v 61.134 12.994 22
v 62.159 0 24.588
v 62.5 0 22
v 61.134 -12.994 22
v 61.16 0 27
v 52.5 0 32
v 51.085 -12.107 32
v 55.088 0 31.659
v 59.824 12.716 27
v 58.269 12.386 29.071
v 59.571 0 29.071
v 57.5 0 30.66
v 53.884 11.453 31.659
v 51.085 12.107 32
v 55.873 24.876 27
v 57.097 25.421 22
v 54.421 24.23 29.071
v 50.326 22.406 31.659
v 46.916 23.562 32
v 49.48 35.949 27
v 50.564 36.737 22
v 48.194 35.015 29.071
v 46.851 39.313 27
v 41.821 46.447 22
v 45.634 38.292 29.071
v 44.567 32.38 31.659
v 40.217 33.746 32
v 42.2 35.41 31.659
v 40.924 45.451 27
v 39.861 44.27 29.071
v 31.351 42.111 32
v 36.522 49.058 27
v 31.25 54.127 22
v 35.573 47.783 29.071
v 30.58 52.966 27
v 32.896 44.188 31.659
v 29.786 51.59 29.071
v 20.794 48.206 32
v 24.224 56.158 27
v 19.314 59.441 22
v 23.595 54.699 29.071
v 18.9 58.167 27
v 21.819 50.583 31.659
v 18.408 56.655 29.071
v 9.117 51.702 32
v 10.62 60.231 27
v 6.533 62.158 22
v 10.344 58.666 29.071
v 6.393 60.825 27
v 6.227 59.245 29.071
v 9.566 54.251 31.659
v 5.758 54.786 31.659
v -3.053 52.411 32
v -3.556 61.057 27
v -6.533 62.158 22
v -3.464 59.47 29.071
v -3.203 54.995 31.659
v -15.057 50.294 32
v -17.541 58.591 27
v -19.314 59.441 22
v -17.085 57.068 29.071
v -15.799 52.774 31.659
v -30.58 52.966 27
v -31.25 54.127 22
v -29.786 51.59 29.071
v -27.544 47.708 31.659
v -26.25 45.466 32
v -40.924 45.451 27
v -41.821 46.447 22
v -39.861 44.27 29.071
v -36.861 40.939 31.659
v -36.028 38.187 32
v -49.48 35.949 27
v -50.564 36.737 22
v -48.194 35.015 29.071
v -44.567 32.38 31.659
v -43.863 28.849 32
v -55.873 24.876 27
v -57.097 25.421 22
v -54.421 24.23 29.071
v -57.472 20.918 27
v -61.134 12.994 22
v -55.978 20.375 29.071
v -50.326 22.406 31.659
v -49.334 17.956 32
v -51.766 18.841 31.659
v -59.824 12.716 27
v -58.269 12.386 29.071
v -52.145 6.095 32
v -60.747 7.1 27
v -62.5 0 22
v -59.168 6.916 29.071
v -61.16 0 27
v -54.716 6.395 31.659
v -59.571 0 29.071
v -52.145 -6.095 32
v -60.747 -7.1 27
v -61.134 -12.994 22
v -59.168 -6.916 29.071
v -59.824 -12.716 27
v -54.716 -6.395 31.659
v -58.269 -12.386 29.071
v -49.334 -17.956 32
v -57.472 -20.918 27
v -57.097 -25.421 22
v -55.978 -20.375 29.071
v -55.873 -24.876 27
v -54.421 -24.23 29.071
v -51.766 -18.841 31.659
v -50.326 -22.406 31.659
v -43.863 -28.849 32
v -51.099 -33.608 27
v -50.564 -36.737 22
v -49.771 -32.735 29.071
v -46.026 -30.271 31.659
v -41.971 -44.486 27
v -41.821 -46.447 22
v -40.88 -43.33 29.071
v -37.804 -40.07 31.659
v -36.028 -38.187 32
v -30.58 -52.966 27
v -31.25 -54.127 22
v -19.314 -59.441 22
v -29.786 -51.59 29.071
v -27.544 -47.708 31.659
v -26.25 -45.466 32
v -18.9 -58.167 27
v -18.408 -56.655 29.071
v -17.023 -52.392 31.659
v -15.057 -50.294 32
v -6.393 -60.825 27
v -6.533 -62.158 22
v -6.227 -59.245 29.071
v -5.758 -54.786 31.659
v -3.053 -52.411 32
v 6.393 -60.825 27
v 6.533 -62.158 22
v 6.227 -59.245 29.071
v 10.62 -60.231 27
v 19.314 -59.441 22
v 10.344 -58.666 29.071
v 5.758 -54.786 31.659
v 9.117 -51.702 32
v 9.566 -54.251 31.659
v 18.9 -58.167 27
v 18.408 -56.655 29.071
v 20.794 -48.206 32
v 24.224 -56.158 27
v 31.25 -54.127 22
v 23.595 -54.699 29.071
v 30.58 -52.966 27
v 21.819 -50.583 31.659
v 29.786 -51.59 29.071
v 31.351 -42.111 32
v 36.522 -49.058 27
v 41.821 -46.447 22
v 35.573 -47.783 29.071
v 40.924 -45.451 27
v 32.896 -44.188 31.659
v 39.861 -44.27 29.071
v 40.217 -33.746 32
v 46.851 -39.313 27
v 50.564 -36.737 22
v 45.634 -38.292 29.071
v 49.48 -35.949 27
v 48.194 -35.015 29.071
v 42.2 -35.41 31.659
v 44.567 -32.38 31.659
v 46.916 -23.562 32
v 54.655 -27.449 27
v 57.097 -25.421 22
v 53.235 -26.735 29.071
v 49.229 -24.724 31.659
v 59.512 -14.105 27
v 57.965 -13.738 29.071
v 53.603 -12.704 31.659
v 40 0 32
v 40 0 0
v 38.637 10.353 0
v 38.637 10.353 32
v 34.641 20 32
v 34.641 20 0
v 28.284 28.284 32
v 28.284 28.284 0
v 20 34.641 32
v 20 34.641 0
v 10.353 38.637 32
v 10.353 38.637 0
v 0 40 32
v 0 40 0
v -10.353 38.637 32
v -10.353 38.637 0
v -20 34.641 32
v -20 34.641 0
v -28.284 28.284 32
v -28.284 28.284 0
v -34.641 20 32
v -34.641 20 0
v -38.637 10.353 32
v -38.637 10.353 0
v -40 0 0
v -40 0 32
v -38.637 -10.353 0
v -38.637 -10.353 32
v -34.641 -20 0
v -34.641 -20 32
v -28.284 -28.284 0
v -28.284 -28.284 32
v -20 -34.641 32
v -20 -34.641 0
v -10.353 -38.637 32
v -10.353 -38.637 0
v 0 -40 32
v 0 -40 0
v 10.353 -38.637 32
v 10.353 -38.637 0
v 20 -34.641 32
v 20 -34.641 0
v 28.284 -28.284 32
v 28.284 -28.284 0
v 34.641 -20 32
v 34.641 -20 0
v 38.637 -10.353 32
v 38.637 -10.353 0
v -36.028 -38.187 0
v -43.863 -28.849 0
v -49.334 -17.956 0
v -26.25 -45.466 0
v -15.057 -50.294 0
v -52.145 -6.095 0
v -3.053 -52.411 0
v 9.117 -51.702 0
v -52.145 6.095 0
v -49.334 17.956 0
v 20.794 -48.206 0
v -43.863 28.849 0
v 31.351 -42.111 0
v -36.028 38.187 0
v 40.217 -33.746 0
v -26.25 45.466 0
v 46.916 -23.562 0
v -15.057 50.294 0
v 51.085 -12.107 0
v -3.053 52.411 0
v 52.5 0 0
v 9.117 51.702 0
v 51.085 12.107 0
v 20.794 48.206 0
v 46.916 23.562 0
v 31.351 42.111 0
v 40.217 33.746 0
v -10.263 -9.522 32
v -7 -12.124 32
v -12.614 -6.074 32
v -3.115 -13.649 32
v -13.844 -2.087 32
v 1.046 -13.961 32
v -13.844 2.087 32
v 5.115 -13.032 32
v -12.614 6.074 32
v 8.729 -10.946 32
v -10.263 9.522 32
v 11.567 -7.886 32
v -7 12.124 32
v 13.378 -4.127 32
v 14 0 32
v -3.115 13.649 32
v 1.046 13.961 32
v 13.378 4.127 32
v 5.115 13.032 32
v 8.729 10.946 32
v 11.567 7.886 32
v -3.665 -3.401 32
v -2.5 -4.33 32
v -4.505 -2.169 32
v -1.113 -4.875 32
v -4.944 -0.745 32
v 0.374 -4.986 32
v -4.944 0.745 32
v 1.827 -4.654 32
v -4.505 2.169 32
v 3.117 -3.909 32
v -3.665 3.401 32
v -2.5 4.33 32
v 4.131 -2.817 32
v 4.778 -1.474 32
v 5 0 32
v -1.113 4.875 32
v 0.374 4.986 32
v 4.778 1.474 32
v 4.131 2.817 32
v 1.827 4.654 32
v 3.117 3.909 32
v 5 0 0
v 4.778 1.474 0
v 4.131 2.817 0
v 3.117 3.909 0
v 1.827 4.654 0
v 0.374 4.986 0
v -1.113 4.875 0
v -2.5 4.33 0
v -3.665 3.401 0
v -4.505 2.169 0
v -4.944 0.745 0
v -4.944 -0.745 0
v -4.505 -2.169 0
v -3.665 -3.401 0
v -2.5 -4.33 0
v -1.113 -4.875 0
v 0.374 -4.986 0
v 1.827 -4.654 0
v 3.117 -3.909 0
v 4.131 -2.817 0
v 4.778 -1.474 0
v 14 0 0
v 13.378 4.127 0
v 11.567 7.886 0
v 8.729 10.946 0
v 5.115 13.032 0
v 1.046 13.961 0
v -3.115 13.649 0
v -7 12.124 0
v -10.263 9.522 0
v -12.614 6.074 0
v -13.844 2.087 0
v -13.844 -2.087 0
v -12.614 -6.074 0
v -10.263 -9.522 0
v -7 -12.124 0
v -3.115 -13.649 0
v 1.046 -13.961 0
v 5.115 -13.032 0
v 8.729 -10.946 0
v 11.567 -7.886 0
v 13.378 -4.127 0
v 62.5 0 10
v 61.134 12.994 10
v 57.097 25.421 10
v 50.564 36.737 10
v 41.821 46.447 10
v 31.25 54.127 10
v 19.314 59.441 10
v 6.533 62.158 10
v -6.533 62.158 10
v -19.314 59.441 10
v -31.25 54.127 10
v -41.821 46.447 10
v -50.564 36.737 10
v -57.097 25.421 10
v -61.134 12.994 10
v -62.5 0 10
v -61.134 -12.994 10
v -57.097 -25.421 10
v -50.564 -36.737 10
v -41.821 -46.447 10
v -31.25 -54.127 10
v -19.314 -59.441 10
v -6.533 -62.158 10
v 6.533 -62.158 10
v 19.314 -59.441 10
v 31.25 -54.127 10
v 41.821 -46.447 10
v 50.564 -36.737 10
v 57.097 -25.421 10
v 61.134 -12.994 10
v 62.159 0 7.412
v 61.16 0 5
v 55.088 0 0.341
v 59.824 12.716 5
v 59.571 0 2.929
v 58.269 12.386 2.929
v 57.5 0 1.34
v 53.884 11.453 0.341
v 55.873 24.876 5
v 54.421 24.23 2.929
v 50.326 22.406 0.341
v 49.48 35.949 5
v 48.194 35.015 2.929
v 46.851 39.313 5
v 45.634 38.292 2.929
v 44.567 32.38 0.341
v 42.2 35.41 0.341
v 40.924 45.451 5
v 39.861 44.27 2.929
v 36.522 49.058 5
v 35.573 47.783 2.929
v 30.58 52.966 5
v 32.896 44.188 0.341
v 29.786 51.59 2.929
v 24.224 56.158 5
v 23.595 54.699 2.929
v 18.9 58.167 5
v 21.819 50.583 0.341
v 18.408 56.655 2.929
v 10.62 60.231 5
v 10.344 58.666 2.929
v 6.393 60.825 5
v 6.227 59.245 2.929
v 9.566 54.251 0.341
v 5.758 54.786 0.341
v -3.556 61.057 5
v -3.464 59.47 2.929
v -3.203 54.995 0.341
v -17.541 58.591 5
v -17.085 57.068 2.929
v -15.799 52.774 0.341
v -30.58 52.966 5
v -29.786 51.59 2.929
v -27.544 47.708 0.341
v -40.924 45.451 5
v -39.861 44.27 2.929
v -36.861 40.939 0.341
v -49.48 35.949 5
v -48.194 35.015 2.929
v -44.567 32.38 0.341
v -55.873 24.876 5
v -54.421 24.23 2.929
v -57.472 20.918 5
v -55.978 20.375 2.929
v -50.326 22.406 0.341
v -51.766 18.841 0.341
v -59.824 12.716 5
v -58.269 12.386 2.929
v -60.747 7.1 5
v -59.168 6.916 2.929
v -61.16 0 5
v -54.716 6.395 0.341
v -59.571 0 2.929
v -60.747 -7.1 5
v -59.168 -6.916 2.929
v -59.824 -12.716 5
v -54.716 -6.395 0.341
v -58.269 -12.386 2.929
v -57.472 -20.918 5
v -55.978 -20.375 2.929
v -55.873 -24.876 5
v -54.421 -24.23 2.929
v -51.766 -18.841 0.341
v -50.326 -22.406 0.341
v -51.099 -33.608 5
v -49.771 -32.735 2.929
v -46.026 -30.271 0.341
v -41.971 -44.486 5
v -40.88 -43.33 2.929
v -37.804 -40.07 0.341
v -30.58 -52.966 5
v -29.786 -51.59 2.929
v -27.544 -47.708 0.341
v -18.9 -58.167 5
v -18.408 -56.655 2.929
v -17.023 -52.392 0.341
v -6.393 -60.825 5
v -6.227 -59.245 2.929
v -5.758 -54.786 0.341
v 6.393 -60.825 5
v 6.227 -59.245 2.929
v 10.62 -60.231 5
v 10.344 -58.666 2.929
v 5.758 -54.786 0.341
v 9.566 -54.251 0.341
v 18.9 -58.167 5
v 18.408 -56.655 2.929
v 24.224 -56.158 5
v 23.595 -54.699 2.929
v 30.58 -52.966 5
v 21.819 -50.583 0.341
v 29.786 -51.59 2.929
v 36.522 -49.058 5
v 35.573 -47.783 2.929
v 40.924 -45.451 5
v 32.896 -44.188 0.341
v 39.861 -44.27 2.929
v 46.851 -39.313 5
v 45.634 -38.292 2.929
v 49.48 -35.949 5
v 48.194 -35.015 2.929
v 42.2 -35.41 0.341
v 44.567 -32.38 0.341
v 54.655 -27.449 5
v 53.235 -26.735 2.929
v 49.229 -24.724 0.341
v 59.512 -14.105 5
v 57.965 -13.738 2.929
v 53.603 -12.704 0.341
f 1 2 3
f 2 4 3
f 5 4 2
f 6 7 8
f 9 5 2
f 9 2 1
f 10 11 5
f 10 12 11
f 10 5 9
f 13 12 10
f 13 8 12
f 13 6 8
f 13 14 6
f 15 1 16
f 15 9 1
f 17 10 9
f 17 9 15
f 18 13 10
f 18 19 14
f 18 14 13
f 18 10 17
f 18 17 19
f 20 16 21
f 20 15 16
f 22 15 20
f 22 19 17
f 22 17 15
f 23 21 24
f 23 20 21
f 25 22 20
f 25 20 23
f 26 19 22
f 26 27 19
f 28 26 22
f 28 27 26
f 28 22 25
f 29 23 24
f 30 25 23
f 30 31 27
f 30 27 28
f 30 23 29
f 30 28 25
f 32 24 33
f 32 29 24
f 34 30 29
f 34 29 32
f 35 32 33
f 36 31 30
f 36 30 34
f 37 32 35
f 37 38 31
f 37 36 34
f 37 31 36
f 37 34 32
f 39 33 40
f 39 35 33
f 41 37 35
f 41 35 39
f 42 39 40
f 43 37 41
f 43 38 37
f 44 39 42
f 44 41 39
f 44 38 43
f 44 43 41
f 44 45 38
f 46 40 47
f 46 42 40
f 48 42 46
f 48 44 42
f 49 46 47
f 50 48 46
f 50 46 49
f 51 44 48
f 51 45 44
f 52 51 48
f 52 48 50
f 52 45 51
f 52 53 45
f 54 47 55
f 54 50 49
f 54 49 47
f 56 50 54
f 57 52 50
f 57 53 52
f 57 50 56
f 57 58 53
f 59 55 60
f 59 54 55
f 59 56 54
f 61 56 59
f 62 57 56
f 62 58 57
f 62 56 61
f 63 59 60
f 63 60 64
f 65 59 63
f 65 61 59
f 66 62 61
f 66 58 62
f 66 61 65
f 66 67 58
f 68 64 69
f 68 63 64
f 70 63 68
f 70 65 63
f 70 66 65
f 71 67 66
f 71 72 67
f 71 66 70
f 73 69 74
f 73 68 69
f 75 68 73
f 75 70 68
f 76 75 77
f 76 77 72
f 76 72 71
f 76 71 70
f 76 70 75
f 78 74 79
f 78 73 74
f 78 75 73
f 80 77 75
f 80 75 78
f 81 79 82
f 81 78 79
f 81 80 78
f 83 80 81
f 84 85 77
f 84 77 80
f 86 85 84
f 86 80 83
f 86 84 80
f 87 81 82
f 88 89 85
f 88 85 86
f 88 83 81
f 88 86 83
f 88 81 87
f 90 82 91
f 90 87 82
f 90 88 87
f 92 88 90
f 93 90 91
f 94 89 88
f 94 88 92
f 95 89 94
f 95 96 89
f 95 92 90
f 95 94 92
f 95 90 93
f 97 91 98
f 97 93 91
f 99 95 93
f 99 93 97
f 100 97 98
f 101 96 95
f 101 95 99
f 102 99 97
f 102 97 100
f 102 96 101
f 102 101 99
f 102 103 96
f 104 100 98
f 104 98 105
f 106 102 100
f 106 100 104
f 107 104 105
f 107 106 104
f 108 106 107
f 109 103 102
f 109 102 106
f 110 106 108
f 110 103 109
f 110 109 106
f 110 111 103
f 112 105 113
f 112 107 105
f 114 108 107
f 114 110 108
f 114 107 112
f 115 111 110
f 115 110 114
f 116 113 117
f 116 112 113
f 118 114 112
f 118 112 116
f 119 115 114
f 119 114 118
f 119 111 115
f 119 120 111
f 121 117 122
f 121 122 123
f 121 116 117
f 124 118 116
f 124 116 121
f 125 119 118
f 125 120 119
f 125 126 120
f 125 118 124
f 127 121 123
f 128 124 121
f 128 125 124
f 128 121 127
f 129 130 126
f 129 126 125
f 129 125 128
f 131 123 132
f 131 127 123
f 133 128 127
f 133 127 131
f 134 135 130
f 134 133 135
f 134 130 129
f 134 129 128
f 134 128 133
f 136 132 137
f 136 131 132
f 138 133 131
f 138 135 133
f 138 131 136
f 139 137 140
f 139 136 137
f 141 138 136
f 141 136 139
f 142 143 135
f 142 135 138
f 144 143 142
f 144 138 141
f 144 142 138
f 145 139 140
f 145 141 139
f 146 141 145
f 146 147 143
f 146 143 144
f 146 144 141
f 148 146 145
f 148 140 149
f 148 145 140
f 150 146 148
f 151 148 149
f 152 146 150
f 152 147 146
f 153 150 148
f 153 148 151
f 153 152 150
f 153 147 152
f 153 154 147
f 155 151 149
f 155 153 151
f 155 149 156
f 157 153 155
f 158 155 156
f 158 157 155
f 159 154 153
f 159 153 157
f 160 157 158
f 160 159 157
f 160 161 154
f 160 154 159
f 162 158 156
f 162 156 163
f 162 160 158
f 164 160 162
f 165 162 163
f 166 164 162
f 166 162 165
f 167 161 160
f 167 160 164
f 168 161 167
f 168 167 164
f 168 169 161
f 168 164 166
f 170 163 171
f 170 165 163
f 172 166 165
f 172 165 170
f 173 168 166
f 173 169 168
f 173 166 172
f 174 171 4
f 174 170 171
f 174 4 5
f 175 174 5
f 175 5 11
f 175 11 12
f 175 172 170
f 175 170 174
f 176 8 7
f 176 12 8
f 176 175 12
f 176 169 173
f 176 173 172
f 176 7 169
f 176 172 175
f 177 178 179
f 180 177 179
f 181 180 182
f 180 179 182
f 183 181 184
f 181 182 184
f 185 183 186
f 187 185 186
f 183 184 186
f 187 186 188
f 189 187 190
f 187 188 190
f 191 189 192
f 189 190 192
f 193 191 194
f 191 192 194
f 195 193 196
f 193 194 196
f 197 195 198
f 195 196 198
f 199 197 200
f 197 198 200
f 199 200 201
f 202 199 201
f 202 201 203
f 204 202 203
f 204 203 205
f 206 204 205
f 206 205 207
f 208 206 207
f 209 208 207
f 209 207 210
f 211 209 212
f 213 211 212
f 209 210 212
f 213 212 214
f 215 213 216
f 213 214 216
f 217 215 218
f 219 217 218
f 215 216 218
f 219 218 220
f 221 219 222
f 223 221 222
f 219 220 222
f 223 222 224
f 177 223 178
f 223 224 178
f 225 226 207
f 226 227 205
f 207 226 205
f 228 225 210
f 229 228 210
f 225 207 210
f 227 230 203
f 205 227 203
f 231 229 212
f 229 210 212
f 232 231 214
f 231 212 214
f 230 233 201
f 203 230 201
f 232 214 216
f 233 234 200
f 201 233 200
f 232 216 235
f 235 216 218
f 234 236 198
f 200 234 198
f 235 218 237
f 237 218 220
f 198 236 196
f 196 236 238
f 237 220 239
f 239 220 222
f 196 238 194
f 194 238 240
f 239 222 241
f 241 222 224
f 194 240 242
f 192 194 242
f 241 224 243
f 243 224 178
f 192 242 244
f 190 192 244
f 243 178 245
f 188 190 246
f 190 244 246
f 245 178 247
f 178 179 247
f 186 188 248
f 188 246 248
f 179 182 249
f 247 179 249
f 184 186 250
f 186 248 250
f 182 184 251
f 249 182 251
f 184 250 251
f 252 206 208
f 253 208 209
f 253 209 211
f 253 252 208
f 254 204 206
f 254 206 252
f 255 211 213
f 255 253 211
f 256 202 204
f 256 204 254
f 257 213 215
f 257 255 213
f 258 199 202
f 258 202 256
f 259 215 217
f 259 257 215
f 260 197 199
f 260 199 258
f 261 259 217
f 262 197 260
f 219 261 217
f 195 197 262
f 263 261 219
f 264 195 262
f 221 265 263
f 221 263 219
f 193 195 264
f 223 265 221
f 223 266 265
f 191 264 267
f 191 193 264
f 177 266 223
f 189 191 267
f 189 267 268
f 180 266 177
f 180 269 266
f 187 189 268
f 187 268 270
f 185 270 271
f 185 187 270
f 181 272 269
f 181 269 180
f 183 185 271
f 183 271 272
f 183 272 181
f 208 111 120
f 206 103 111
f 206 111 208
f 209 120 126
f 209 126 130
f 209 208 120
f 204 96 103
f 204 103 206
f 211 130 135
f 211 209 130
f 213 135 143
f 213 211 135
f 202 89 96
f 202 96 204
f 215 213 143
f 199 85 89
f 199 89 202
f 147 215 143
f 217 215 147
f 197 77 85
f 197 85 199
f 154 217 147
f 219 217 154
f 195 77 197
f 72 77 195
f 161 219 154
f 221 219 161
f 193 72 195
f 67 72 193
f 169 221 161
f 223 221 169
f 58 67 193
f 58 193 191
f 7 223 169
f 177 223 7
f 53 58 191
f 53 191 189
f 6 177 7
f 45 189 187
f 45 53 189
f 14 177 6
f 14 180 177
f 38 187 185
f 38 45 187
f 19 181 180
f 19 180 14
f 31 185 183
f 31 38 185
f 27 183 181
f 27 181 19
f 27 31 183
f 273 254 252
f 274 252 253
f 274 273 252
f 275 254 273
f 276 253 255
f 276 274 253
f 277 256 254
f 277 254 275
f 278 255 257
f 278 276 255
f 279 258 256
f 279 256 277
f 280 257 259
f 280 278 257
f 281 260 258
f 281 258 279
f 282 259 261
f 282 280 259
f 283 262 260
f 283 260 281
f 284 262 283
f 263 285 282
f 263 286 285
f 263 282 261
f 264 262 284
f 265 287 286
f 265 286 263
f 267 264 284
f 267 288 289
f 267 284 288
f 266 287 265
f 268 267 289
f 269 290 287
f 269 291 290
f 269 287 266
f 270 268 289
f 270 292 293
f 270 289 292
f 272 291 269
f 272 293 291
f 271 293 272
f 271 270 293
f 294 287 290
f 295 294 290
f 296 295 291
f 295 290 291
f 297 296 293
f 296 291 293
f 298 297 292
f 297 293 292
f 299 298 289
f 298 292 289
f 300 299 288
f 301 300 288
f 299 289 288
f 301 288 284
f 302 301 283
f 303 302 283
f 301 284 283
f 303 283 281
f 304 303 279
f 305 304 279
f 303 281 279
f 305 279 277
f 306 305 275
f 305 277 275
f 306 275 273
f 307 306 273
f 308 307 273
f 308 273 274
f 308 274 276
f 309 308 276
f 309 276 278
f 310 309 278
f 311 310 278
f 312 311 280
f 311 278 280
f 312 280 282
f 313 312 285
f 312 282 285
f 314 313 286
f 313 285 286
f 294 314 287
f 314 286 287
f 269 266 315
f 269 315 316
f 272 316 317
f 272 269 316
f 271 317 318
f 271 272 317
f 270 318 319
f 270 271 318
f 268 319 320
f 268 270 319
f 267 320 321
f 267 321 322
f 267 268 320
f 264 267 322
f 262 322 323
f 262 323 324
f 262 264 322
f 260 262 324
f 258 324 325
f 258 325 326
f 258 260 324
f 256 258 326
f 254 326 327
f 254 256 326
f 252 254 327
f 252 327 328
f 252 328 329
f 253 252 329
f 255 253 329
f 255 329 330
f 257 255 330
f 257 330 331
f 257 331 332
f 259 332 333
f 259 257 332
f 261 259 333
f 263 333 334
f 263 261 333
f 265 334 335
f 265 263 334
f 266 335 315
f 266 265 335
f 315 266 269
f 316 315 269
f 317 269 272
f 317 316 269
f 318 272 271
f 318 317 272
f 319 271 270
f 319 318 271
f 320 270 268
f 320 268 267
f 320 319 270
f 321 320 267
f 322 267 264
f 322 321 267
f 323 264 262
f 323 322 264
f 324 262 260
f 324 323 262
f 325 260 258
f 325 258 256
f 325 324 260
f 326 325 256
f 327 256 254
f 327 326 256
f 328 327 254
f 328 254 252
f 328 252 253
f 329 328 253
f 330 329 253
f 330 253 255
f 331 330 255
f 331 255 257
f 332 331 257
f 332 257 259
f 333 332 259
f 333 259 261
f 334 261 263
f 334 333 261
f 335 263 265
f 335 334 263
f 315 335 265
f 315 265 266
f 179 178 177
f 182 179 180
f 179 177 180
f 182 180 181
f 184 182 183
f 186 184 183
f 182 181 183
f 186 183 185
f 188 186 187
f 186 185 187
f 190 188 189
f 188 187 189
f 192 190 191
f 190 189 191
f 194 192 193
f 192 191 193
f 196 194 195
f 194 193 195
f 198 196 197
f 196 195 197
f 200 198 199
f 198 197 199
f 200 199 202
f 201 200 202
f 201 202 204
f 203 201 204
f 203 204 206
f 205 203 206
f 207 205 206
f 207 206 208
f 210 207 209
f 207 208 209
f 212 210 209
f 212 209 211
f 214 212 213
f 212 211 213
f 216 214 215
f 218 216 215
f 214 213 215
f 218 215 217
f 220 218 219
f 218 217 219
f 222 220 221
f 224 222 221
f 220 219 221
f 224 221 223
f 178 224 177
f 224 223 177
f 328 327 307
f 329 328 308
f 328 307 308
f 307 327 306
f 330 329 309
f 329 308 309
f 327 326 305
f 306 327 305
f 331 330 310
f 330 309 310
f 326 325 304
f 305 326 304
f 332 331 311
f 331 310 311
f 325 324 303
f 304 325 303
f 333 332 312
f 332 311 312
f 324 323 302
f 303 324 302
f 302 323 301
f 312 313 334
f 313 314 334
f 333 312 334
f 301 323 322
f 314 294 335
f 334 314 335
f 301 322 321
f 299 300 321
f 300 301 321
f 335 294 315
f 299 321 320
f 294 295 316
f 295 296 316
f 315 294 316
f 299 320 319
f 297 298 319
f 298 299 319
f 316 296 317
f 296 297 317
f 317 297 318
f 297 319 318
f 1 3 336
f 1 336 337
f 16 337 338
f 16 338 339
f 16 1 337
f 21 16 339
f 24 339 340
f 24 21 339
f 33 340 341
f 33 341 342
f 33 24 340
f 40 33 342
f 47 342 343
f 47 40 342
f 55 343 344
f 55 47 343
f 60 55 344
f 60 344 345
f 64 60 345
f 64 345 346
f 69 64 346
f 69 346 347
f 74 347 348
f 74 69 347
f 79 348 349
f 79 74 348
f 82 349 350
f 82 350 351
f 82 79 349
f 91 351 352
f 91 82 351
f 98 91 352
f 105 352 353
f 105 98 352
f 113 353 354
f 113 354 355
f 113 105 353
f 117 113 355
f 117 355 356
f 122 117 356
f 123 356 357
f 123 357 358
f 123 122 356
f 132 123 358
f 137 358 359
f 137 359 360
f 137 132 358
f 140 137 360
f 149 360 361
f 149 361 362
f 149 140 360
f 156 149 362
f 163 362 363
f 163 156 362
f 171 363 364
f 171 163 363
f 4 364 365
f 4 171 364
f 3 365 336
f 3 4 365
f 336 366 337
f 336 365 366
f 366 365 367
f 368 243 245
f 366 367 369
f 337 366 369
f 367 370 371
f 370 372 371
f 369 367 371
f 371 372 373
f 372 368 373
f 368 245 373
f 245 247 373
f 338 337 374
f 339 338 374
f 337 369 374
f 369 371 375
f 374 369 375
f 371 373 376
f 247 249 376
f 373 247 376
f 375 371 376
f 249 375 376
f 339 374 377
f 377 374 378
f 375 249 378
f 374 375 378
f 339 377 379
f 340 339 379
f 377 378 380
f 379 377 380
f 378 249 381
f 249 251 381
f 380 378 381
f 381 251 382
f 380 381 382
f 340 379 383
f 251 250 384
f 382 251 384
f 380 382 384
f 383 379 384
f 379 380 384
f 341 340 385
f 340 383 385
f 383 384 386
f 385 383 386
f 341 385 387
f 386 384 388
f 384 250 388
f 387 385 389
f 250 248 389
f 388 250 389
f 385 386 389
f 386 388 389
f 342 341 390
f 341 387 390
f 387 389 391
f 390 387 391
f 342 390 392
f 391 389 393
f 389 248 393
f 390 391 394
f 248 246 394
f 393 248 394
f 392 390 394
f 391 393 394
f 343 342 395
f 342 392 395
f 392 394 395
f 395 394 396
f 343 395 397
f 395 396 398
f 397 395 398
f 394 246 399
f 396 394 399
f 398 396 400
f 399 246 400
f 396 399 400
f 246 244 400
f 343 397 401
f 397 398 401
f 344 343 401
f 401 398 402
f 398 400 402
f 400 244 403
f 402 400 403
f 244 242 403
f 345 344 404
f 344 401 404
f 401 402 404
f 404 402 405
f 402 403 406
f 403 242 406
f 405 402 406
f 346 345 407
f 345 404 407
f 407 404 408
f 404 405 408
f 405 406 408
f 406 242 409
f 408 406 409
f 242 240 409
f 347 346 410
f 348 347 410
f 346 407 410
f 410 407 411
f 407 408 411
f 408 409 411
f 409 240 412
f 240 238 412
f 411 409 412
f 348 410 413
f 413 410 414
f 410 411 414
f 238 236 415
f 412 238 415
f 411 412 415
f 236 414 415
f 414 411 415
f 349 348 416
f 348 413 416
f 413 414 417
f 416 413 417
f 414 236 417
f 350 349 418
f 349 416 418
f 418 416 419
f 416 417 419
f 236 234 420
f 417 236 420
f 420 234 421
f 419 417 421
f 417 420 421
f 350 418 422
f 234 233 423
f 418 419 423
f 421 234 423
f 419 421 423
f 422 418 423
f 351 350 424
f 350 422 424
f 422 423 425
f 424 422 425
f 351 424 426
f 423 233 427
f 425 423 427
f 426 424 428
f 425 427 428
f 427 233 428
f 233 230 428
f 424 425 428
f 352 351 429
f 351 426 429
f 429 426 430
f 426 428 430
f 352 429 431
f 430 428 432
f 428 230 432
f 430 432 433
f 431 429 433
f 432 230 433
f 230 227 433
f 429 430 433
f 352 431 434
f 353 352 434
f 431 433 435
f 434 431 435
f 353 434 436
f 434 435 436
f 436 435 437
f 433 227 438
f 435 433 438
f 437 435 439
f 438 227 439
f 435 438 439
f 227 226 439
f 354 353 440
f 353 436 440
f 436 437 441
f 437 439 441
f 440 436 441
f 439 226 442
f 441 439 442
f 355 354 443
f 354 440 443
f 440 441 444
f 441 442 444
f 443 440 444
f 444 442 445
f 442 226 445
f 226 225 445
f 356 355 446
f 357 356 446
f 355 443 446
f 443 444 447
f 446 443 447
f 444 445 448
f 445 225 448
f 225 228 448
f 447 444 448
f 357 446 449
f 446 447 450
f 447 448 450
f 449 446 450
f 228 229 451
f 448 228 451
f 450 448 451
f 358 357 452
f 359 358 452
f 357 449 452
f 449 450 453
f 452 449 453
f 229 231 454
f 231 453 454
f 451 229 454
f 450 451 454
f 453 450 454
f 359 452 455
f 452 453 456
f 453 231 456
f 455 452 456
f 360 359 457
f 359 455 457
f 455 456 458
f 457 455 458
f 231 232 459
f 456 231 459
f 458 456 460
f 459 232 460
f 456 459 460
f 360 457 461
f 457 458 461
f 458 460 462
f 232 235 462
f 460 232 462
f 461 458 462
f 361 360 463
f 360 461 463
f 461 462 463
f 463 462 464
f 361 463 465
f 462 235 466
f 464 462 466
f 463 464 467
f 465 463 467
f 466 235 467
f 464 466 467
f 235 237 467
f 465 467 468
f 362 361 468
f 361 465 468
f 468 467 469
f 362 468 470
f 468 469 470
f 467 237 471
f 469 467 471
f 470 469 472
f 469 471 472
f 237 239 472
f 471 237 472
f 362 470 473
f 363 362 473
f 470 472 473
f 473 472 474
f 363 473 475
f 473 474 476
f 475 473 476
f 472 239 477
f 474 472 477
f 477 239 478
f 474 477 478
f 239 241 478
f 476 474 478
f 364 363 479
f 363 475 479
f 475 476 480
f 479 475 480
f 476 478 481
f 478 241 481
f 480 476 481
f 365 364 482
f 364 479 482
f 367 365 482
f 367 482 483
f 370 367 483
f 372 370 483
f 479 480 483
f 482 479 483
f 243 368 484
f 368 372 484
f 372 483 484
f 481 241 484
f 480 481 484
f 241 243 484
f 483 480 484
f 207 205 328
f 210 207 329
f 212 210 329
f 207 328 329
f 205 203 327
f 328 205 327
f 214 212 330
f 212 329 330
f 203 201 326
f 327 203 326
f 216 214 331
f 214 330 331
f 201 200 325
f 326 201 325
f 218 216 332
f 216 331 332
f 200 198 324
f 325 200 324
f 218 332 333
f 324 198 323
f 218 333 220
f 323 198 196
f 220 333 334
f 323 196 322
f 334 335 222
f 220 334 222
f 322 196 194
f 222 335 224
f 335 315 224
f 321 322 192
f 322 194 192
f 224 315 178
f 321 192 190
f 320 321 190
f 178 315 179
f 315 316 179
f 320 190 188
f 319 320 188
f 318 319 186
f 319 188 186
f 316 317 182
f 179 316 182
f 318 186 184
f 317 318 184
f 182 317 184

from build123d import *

# Parameters (mm, degrees)
SKETCH1_R           = 40
SKETCH1_R_2         = 14
BOSS_EXTRUDE1_DEPTH = 32
SKETCH2_R           = 62.5
SKETCH2_R_2         = 40
BOSS_EXTRUDE2_DEPTH = 32
SKETCH3_R           = 14
SKETCH3_R_2         = 5
BOSS_EXTRUDE3_DEPTH = 32
FILLET1_R           = 10


with BuildPart() as part:
    # Sketch1 → Boss-Extrude1 (new body)
    with BuildSketch(Plane.XY):
        Circle(SKETCH1_R)
        Circle(SKETCH1_R_2, mode=Mode.SUBTRACT)
    extrude(amount=BOSS_EXTRUDE1_DEPTH)


with BuildPart() as body_2:
    # Sketch2 → Boss-Extrude2 (new body)
    with BuildSketch(Plane.XY.offset(32)):
        Circle(SKETCH2_R)
        Circle(SKETCH2_R_2, mode=Mode.SUBTRACT)
    extrude(amount=-BOSS_EXTRUDE2_DEPTH)

    # Fillet1
    fillet1_edges = [body_2.edges().sort_by_distance(p)[0] for p in [
        (-62.5, 0, 32),
        (-62.5, 0, 0),
    ]]
    fillet(fillet1_edges, radius=FILLET1_R)


with BuildPart() as body_3:
    # Sketch3 → Boss-Extrude3 (new body)
    with BuildSketch(Plane.XY.offset(32)):
        Circle(SKETCH3_R)
        Circle(SKETCH3_R_2, mode=Mode.SUBTRACT)
    extrude(amount=-BOSS_EXTRUDE3_DEPTH)


solid = Compound([part.part, body_2.part, body_3.part])
